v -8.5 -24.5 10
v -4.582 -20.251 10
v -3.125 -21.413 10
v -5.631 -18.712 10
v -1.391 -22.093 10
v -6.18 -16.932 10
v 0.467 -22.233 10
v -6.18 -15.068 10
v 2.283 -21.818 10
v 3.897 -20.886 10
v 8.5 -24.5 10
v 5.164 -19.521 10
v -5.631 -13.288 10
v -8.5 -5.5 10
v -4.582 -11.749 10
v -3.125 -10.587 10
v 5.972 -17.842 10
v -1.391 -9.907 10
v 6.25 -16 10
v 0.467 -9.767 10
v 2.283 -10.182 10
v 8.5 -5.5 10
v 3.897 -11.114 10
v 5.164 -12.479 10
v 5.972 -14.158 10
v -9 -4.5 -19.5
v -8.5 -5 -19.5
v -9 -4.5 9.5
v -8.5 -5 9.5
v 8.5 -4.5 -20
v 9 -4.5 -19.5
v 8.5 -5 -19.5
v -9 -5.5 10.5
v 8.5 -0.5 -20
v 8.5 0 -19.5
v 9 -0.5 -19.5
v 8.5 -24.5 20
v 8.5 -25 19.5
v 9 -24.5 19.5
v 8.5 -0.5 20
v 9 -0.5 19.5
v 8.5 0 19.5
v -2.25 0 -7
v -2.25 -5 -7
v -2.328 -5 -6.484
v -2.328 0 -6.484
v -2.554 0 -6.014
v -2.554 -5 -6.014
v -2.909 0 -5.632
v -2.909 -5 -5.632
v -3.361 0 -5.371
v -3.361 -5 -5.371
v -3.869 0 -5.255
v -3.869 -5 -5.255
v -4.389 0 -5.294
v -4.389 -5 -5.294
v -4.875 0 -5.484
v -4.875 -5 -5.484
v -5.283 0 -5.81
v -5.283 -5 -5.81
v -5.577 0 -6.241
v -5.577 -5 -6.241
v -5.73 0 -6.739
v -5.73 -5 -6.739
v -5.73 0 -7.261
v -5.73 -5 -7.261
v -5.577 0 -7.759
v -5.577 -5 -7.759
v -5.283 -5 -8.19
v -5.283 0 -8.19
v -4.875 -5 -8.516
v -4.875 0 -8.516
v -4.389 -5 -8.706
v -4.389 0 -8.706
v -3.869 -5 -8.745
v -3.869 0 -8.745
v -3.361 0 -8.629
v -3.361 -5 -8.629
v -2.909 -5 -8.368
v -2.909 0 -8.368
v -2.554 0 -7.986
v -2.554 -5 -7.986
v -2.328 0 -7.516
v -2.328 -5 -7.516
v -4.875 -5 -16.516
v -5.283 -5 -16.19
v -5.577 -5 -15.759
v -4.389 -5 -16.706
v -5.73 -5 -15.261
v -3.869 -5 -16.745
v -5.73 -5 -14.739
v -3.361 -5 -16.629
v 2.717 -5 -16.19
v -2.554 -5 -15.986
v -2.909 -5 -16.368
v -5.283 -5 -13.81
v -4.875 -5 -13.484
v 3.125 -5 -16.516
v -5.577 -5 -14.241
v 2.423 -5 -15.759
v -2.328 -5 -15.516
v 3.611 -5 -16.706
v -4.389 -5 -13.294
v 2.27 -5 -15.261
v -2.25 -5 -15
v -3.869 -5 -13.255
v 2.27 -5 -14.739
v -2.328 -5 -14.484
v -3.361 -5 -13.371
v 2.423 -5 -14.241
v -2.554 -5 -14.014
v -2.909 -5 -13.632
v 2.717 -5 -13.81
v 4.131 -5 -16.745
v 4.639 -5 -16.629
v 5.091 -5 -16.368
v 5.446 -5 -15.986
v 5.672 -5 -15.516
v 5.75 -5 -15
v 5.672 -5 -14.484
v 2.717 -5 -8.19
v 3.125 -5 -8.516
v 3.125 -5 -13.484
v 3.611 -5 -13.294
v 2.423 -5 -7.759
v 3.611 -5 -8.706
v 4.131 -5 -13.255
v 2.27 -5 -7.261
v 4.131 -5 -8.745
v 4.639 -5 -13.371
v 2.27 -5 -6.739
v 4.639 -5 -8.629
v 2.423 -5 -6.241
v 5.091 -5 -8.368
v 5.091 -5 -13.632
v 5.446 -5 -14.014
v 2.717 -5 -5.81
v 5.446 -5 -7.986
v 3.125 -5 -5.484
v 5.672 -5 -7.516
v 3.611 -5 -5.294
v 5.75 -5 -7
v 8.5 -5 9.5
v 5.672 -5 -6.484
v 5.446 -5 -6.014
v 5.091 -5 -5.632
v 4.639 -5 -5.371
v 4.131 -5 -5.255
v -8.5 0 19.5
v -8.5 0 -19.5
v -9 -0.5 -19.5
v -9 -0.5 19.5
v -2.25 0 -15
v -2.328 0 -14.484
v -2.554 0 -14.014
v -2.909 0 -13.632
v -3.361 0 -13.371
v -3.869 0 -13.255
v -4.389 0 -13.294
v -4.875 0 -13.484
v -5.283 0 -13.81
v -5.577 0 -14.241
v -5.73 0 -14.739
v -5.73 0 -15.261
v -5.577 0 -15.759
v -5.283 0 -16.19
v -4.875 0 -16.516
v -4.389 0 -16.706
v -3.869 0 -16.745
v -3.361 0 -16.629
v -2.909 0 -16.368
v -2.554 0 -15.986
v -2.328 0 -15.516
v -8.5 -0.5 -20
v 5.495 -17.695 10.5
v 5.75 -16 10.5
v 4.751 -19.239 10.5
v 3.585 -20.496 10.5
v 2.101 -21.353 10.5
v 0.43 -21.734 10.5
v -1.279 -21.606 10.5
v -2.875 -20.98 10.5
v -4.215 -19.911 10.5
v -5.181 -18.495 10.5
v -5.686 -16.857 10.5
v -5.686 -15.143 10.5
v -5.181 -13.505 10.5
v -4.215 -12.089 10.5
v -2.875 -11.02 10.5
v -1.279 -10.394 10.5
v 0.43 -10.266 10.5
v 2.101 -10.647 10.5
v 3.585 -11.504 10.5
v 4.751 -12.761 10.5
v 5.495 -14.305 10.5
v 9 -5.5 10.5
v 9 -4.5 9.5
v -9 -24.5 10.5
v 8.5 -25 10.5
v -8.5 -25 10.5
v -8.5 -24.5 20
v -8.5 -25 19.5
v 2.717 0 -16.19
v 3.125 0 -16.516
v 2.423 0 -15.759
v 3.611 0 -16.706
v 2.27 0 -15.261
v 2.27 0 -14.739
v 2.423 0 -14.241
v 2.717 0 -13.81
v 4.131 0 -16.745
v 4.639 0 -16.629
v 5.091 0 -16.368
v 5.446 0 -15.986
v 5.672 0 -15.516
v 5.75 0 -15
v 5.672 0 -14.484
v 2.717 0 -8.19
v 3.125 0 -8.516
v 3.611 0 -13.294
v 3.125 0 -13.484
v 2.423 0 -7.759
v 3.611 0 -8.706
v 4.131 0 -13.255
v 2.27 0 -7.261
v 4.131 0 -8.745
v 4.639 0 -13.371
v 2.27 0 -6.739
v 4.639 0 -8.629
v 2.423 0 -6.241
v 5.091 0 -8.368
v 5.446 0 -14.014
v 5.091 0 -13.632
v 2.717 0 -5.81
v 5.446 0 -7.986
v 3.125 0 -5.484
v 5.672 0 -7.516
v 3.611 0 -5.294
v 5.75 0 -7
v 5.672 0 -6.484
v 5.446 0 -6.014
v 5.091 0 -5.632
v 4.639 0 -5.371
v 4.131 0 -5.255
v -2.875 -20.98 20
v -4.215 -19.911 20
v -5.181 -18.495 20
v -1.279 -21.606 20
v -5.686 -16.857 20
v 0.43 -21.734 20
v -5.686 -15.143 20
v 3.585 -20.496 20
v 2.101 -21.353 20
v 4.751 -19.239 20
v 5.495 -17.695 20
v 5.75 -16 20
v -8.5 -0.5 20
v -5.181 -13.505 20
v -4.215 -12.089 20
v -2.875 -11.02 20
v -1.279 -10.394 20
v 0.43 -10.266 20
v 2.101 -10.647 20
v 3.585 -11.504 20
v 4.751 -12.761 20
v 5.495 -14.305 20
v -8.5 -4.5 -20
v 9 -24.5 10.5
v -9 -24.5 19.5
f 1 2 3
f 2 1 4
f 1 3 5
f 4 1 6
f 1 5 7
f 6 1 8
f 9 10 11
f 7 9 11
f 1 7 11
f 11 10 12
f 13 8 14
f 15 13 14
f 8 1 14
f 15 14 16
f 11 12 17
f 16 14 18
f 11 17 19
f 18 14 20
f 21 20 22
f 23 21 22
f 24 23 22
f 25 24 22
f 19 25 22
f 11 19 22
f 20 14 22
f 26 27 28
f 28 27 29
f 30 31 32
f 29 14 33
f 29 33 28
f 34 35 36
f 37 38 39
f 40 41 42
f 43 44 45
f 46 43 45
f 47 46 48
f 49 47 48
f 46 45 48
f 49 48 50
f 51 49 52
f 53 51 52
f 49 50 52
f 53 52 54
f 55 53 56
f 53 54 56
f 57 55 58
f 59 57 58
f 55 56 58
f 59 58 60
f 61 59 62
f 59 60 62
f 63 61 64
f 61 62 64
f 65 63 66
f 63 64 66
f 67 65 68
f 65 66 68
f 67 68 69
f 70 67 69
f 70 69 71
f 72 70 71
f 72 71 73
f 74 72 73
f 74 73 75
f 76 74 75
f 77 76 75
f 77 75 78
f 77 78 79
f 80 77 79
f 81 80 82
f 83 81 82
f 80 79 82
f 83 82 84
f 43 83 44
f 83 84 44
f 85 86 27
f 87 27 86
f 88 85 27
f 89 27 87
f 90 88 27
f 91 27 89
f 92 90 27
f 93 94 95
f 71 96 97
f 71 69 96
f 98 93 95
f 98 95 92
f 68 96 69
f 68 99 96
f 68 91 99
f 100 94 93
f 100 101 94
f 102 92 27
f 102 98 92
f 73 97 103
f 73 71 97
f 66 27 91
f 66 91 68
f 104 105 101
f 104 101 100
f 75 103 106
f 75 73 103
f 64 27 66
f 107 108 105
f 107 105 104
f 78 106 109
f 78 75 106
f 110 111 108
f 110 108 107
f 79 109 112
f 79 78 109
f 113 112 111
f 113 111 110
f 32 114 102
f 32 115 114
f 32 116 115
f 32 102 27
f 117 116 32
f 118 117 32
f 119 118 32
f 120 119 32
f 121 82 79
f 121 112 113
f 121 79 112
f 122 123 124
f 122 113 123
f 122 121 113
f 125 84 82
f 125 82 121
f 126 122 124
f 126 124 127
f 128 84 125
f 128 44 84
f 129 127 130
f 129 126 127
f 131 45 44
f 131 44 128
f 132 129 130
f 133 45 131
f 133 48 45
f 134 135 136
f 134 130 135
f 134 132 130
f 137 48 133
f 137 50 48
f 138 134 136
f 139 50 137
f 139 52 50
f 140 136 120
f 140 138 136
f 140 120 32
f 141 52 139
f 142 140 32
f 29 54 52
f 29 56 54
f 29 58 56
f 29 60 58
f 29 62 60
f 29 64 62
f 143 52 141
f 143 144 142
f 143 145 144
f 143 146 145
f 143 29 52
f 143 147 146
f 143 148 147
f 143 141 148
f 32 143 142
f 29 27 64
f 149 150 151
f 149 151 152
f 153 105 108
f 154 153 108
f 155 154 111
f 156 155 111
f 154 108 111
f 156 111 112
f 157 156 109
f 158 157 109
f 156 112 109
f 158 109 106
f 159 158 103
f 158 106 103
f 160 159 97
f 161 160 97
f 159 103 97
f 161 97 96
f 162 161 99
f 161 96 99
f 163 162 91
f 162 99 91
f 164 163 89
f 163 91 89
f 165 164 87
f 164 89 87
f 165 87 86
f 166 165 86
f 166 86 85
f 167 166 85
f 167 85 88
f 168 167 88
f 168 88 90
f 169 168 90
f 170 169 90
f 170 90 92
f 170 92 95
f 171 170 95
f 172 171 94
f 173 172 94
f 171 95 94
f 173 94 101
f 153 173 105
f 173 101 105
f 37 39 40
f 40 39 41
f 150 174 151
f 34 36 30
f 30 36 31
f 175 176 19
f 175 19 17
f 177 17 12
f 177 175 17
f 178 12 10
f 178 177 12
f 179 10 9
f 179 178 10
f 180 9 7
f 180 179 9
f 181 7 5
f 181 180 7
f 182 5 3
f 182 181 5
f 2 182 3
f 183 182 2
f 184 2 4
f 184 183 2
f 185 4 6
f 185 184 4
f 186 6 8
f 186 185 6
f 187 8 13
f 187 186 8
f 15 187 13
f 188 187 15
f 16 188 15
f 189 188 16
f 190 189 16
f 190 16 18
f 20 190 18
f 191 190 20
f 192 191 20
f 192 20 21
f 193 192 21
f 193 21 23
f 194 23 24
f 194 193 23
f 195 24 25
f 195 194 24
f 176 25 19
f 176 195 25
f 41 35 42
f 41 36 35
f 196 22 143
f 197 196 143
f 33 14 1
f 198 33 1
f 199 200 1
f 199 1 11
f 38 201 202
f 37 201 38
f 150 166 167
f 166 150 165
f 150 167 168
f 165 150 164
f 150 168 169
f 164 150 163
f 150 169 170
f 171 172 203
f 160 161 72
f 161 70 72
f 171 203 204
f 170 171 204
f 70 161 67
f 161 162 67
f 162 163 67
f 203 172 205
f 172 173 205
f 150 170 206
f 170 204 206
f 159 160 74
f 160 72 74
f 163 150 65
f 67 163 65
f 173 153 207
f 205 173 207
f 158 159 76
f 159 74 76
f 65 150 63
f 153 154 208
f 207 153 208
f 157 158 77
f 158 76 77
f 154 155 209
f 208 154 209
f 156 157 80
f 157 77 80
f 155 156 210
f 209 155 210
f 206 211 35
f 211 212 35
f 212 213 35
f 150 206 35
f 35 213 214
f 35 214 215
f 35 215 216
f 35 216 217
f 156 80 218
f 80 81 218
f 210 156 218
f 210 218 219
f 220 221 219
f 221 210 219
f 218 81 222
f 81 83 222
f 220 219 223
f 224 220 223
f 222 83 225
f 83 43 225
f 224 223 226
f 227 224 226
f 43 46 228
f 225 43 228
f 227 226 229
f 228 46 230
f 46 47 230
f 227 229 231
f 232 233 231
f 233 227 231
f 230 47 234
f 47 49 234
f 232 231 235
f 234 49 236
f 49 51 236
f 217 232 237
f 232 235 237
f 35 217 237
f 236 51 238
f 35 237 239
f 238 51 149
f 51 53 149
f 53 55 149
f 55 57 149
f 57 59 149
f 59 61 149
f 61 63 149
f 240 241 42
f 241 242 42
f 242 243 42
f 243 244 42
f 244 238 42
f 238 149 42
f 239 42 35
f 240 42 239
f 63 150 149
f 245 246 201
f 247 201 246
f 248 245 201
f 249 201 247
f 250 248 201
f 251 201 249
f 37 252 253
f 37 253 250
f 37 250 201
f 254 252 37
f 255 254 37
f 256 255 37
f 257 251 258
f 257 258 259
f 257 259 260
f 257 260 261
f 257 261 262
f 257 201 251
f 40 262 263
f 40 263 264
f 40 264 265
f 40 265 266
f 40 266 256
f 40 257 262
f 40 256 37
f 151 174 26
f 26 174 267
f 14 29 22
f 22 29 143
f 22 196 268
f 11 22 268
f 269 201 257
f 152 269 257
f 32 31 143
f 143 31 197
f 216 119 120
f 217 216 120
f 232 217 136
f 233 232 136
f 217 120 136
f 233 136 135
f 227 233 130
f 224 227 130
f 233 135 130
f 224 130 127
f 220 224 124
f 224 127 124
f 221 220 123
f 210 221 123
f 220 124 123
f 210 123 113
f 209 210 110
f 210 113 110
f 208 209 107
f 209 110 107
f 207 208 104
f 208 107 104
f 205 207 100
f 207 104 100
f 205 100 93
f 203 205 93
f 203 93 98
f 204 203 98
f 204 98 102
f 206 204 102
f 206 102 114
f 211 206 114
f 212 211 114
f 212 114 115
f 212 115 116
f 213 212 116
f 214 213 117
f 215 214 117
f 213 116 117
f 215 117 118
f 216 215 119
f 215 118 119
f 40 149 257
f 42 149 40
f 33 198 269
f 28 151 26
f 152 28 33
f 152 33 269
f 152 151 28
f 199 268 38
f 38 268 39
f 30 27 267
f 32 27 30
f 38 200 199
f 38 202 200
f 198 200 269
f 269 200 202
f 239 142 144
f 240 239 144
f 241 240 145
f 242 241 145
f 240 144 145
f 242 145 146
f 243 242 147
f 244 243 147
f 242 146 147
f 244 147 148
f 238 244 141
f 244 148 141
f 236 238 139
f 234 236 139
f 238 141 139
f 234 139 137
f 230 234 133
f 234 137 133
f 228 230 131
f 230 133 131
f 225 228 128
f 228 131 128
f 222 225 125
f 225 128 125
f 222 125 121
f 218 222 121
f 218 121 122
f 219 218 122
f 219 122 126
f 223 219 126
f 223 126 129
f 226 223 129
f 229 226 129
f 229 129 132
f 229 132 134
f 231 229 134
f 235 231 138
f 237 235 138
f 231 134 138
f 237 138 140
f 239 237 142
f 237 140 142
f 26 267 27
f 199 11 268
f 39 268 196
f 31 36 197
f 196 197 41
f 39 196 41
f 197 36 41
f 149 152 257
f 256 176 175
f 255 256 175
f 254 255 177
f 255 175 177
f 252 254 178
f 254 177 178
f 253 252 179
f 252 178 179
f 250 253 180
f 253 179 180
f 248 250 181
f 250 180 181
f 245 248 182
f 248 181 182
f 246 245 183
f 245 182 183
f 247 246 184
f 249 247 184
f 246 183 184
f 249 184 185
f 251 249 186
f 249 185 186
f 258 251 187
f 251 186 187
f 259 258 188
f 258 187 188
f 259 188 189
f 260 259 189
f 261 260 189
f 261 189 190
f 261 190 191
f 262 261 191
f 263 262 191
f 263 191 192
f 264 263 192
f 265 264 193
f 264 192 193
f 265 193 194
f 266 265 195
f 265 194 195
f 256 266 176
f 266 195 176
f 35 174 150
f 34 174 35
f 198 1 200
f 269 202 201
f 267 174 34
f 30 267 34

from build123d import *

# Parameters (mm, degrees)
F0_W     = 18
F0_H     = 40
F1_DEPTH = 5
F2_R     = 1.75
F3_DEPTH = 5
F4_W     = 18
F4_H     = 10
F5_DEPTH = 20
F6_R     = 5.75
F7_DEPTH = 10
F8_SIZE  = 0.5


with BuildPart() as f1:
    # F0 (on Front) → F1 (new body)
    with BuildSketch(Plane.XZ):
        Rectangle(F0_W, F0_H)
    extrude(amount=F1_DEPTH)

    # F2 (on face) → F3 (cut, through all)
    with BuildSketch(Plane.XZ.offset(5)):
        with Locations((-4, -15)):
            Circle(F2_R)
        with Locations((4, -15)):
            Circle(F2_R)
        with Locations((4, -7)):
            Circle(F2_R)
        with Locations((-4, -7)):
            Circle(F2_R)
    extrude(amount=-F3_DEPTH, mode=Mode.SUBTRACT)

    # F4 (on face) → F5 (join)
    with BuildSketch(Plane.XZ.offset(5)):
        with Locations((0, 15)):
            Rectangle(F4_W, F4_H)
    extrude(amount=F5_DEPTH)

    # F6 (on face) → F7 (cut, through all)
    with BuildSketch(Plane(origin=(0, 0, 10), x_dir=(1, 0, 0), z_dir=(0, 0, -1))):
        with Locations((0, 16)):
            Circle(F6_R)
    extrude(amount=-F7_DEPTH, mode=Mode.SUBTRACT)

    # F8
    f8_edges = [f1.edges().sort_by_distance(p)[0] for p in [
        (9, -15, 10),
        (-9, -15, 10),
        (0, -25, 10),
        (9, -25, 15),
        (-9, -25, 15),
        (0, -25, 20),
        (9, -12.5, 20),
        (9, -5, -5),
        (9, 0, 0),
        (0, 0, -20),
        (9, -2.5, -20),
        (0, -5, -20),
        (-9, -2.5, -20),
        (-9, -5, -5),
        (-9, 0, 0),
        (-9, -12.5, 20),
        (0, 0, 20),
        (0, -5, 10),
        (-5.75, -16, 10),
    ]]
    chamfer(f8_edges, length=F8_SIZE)


solid = f1.part
